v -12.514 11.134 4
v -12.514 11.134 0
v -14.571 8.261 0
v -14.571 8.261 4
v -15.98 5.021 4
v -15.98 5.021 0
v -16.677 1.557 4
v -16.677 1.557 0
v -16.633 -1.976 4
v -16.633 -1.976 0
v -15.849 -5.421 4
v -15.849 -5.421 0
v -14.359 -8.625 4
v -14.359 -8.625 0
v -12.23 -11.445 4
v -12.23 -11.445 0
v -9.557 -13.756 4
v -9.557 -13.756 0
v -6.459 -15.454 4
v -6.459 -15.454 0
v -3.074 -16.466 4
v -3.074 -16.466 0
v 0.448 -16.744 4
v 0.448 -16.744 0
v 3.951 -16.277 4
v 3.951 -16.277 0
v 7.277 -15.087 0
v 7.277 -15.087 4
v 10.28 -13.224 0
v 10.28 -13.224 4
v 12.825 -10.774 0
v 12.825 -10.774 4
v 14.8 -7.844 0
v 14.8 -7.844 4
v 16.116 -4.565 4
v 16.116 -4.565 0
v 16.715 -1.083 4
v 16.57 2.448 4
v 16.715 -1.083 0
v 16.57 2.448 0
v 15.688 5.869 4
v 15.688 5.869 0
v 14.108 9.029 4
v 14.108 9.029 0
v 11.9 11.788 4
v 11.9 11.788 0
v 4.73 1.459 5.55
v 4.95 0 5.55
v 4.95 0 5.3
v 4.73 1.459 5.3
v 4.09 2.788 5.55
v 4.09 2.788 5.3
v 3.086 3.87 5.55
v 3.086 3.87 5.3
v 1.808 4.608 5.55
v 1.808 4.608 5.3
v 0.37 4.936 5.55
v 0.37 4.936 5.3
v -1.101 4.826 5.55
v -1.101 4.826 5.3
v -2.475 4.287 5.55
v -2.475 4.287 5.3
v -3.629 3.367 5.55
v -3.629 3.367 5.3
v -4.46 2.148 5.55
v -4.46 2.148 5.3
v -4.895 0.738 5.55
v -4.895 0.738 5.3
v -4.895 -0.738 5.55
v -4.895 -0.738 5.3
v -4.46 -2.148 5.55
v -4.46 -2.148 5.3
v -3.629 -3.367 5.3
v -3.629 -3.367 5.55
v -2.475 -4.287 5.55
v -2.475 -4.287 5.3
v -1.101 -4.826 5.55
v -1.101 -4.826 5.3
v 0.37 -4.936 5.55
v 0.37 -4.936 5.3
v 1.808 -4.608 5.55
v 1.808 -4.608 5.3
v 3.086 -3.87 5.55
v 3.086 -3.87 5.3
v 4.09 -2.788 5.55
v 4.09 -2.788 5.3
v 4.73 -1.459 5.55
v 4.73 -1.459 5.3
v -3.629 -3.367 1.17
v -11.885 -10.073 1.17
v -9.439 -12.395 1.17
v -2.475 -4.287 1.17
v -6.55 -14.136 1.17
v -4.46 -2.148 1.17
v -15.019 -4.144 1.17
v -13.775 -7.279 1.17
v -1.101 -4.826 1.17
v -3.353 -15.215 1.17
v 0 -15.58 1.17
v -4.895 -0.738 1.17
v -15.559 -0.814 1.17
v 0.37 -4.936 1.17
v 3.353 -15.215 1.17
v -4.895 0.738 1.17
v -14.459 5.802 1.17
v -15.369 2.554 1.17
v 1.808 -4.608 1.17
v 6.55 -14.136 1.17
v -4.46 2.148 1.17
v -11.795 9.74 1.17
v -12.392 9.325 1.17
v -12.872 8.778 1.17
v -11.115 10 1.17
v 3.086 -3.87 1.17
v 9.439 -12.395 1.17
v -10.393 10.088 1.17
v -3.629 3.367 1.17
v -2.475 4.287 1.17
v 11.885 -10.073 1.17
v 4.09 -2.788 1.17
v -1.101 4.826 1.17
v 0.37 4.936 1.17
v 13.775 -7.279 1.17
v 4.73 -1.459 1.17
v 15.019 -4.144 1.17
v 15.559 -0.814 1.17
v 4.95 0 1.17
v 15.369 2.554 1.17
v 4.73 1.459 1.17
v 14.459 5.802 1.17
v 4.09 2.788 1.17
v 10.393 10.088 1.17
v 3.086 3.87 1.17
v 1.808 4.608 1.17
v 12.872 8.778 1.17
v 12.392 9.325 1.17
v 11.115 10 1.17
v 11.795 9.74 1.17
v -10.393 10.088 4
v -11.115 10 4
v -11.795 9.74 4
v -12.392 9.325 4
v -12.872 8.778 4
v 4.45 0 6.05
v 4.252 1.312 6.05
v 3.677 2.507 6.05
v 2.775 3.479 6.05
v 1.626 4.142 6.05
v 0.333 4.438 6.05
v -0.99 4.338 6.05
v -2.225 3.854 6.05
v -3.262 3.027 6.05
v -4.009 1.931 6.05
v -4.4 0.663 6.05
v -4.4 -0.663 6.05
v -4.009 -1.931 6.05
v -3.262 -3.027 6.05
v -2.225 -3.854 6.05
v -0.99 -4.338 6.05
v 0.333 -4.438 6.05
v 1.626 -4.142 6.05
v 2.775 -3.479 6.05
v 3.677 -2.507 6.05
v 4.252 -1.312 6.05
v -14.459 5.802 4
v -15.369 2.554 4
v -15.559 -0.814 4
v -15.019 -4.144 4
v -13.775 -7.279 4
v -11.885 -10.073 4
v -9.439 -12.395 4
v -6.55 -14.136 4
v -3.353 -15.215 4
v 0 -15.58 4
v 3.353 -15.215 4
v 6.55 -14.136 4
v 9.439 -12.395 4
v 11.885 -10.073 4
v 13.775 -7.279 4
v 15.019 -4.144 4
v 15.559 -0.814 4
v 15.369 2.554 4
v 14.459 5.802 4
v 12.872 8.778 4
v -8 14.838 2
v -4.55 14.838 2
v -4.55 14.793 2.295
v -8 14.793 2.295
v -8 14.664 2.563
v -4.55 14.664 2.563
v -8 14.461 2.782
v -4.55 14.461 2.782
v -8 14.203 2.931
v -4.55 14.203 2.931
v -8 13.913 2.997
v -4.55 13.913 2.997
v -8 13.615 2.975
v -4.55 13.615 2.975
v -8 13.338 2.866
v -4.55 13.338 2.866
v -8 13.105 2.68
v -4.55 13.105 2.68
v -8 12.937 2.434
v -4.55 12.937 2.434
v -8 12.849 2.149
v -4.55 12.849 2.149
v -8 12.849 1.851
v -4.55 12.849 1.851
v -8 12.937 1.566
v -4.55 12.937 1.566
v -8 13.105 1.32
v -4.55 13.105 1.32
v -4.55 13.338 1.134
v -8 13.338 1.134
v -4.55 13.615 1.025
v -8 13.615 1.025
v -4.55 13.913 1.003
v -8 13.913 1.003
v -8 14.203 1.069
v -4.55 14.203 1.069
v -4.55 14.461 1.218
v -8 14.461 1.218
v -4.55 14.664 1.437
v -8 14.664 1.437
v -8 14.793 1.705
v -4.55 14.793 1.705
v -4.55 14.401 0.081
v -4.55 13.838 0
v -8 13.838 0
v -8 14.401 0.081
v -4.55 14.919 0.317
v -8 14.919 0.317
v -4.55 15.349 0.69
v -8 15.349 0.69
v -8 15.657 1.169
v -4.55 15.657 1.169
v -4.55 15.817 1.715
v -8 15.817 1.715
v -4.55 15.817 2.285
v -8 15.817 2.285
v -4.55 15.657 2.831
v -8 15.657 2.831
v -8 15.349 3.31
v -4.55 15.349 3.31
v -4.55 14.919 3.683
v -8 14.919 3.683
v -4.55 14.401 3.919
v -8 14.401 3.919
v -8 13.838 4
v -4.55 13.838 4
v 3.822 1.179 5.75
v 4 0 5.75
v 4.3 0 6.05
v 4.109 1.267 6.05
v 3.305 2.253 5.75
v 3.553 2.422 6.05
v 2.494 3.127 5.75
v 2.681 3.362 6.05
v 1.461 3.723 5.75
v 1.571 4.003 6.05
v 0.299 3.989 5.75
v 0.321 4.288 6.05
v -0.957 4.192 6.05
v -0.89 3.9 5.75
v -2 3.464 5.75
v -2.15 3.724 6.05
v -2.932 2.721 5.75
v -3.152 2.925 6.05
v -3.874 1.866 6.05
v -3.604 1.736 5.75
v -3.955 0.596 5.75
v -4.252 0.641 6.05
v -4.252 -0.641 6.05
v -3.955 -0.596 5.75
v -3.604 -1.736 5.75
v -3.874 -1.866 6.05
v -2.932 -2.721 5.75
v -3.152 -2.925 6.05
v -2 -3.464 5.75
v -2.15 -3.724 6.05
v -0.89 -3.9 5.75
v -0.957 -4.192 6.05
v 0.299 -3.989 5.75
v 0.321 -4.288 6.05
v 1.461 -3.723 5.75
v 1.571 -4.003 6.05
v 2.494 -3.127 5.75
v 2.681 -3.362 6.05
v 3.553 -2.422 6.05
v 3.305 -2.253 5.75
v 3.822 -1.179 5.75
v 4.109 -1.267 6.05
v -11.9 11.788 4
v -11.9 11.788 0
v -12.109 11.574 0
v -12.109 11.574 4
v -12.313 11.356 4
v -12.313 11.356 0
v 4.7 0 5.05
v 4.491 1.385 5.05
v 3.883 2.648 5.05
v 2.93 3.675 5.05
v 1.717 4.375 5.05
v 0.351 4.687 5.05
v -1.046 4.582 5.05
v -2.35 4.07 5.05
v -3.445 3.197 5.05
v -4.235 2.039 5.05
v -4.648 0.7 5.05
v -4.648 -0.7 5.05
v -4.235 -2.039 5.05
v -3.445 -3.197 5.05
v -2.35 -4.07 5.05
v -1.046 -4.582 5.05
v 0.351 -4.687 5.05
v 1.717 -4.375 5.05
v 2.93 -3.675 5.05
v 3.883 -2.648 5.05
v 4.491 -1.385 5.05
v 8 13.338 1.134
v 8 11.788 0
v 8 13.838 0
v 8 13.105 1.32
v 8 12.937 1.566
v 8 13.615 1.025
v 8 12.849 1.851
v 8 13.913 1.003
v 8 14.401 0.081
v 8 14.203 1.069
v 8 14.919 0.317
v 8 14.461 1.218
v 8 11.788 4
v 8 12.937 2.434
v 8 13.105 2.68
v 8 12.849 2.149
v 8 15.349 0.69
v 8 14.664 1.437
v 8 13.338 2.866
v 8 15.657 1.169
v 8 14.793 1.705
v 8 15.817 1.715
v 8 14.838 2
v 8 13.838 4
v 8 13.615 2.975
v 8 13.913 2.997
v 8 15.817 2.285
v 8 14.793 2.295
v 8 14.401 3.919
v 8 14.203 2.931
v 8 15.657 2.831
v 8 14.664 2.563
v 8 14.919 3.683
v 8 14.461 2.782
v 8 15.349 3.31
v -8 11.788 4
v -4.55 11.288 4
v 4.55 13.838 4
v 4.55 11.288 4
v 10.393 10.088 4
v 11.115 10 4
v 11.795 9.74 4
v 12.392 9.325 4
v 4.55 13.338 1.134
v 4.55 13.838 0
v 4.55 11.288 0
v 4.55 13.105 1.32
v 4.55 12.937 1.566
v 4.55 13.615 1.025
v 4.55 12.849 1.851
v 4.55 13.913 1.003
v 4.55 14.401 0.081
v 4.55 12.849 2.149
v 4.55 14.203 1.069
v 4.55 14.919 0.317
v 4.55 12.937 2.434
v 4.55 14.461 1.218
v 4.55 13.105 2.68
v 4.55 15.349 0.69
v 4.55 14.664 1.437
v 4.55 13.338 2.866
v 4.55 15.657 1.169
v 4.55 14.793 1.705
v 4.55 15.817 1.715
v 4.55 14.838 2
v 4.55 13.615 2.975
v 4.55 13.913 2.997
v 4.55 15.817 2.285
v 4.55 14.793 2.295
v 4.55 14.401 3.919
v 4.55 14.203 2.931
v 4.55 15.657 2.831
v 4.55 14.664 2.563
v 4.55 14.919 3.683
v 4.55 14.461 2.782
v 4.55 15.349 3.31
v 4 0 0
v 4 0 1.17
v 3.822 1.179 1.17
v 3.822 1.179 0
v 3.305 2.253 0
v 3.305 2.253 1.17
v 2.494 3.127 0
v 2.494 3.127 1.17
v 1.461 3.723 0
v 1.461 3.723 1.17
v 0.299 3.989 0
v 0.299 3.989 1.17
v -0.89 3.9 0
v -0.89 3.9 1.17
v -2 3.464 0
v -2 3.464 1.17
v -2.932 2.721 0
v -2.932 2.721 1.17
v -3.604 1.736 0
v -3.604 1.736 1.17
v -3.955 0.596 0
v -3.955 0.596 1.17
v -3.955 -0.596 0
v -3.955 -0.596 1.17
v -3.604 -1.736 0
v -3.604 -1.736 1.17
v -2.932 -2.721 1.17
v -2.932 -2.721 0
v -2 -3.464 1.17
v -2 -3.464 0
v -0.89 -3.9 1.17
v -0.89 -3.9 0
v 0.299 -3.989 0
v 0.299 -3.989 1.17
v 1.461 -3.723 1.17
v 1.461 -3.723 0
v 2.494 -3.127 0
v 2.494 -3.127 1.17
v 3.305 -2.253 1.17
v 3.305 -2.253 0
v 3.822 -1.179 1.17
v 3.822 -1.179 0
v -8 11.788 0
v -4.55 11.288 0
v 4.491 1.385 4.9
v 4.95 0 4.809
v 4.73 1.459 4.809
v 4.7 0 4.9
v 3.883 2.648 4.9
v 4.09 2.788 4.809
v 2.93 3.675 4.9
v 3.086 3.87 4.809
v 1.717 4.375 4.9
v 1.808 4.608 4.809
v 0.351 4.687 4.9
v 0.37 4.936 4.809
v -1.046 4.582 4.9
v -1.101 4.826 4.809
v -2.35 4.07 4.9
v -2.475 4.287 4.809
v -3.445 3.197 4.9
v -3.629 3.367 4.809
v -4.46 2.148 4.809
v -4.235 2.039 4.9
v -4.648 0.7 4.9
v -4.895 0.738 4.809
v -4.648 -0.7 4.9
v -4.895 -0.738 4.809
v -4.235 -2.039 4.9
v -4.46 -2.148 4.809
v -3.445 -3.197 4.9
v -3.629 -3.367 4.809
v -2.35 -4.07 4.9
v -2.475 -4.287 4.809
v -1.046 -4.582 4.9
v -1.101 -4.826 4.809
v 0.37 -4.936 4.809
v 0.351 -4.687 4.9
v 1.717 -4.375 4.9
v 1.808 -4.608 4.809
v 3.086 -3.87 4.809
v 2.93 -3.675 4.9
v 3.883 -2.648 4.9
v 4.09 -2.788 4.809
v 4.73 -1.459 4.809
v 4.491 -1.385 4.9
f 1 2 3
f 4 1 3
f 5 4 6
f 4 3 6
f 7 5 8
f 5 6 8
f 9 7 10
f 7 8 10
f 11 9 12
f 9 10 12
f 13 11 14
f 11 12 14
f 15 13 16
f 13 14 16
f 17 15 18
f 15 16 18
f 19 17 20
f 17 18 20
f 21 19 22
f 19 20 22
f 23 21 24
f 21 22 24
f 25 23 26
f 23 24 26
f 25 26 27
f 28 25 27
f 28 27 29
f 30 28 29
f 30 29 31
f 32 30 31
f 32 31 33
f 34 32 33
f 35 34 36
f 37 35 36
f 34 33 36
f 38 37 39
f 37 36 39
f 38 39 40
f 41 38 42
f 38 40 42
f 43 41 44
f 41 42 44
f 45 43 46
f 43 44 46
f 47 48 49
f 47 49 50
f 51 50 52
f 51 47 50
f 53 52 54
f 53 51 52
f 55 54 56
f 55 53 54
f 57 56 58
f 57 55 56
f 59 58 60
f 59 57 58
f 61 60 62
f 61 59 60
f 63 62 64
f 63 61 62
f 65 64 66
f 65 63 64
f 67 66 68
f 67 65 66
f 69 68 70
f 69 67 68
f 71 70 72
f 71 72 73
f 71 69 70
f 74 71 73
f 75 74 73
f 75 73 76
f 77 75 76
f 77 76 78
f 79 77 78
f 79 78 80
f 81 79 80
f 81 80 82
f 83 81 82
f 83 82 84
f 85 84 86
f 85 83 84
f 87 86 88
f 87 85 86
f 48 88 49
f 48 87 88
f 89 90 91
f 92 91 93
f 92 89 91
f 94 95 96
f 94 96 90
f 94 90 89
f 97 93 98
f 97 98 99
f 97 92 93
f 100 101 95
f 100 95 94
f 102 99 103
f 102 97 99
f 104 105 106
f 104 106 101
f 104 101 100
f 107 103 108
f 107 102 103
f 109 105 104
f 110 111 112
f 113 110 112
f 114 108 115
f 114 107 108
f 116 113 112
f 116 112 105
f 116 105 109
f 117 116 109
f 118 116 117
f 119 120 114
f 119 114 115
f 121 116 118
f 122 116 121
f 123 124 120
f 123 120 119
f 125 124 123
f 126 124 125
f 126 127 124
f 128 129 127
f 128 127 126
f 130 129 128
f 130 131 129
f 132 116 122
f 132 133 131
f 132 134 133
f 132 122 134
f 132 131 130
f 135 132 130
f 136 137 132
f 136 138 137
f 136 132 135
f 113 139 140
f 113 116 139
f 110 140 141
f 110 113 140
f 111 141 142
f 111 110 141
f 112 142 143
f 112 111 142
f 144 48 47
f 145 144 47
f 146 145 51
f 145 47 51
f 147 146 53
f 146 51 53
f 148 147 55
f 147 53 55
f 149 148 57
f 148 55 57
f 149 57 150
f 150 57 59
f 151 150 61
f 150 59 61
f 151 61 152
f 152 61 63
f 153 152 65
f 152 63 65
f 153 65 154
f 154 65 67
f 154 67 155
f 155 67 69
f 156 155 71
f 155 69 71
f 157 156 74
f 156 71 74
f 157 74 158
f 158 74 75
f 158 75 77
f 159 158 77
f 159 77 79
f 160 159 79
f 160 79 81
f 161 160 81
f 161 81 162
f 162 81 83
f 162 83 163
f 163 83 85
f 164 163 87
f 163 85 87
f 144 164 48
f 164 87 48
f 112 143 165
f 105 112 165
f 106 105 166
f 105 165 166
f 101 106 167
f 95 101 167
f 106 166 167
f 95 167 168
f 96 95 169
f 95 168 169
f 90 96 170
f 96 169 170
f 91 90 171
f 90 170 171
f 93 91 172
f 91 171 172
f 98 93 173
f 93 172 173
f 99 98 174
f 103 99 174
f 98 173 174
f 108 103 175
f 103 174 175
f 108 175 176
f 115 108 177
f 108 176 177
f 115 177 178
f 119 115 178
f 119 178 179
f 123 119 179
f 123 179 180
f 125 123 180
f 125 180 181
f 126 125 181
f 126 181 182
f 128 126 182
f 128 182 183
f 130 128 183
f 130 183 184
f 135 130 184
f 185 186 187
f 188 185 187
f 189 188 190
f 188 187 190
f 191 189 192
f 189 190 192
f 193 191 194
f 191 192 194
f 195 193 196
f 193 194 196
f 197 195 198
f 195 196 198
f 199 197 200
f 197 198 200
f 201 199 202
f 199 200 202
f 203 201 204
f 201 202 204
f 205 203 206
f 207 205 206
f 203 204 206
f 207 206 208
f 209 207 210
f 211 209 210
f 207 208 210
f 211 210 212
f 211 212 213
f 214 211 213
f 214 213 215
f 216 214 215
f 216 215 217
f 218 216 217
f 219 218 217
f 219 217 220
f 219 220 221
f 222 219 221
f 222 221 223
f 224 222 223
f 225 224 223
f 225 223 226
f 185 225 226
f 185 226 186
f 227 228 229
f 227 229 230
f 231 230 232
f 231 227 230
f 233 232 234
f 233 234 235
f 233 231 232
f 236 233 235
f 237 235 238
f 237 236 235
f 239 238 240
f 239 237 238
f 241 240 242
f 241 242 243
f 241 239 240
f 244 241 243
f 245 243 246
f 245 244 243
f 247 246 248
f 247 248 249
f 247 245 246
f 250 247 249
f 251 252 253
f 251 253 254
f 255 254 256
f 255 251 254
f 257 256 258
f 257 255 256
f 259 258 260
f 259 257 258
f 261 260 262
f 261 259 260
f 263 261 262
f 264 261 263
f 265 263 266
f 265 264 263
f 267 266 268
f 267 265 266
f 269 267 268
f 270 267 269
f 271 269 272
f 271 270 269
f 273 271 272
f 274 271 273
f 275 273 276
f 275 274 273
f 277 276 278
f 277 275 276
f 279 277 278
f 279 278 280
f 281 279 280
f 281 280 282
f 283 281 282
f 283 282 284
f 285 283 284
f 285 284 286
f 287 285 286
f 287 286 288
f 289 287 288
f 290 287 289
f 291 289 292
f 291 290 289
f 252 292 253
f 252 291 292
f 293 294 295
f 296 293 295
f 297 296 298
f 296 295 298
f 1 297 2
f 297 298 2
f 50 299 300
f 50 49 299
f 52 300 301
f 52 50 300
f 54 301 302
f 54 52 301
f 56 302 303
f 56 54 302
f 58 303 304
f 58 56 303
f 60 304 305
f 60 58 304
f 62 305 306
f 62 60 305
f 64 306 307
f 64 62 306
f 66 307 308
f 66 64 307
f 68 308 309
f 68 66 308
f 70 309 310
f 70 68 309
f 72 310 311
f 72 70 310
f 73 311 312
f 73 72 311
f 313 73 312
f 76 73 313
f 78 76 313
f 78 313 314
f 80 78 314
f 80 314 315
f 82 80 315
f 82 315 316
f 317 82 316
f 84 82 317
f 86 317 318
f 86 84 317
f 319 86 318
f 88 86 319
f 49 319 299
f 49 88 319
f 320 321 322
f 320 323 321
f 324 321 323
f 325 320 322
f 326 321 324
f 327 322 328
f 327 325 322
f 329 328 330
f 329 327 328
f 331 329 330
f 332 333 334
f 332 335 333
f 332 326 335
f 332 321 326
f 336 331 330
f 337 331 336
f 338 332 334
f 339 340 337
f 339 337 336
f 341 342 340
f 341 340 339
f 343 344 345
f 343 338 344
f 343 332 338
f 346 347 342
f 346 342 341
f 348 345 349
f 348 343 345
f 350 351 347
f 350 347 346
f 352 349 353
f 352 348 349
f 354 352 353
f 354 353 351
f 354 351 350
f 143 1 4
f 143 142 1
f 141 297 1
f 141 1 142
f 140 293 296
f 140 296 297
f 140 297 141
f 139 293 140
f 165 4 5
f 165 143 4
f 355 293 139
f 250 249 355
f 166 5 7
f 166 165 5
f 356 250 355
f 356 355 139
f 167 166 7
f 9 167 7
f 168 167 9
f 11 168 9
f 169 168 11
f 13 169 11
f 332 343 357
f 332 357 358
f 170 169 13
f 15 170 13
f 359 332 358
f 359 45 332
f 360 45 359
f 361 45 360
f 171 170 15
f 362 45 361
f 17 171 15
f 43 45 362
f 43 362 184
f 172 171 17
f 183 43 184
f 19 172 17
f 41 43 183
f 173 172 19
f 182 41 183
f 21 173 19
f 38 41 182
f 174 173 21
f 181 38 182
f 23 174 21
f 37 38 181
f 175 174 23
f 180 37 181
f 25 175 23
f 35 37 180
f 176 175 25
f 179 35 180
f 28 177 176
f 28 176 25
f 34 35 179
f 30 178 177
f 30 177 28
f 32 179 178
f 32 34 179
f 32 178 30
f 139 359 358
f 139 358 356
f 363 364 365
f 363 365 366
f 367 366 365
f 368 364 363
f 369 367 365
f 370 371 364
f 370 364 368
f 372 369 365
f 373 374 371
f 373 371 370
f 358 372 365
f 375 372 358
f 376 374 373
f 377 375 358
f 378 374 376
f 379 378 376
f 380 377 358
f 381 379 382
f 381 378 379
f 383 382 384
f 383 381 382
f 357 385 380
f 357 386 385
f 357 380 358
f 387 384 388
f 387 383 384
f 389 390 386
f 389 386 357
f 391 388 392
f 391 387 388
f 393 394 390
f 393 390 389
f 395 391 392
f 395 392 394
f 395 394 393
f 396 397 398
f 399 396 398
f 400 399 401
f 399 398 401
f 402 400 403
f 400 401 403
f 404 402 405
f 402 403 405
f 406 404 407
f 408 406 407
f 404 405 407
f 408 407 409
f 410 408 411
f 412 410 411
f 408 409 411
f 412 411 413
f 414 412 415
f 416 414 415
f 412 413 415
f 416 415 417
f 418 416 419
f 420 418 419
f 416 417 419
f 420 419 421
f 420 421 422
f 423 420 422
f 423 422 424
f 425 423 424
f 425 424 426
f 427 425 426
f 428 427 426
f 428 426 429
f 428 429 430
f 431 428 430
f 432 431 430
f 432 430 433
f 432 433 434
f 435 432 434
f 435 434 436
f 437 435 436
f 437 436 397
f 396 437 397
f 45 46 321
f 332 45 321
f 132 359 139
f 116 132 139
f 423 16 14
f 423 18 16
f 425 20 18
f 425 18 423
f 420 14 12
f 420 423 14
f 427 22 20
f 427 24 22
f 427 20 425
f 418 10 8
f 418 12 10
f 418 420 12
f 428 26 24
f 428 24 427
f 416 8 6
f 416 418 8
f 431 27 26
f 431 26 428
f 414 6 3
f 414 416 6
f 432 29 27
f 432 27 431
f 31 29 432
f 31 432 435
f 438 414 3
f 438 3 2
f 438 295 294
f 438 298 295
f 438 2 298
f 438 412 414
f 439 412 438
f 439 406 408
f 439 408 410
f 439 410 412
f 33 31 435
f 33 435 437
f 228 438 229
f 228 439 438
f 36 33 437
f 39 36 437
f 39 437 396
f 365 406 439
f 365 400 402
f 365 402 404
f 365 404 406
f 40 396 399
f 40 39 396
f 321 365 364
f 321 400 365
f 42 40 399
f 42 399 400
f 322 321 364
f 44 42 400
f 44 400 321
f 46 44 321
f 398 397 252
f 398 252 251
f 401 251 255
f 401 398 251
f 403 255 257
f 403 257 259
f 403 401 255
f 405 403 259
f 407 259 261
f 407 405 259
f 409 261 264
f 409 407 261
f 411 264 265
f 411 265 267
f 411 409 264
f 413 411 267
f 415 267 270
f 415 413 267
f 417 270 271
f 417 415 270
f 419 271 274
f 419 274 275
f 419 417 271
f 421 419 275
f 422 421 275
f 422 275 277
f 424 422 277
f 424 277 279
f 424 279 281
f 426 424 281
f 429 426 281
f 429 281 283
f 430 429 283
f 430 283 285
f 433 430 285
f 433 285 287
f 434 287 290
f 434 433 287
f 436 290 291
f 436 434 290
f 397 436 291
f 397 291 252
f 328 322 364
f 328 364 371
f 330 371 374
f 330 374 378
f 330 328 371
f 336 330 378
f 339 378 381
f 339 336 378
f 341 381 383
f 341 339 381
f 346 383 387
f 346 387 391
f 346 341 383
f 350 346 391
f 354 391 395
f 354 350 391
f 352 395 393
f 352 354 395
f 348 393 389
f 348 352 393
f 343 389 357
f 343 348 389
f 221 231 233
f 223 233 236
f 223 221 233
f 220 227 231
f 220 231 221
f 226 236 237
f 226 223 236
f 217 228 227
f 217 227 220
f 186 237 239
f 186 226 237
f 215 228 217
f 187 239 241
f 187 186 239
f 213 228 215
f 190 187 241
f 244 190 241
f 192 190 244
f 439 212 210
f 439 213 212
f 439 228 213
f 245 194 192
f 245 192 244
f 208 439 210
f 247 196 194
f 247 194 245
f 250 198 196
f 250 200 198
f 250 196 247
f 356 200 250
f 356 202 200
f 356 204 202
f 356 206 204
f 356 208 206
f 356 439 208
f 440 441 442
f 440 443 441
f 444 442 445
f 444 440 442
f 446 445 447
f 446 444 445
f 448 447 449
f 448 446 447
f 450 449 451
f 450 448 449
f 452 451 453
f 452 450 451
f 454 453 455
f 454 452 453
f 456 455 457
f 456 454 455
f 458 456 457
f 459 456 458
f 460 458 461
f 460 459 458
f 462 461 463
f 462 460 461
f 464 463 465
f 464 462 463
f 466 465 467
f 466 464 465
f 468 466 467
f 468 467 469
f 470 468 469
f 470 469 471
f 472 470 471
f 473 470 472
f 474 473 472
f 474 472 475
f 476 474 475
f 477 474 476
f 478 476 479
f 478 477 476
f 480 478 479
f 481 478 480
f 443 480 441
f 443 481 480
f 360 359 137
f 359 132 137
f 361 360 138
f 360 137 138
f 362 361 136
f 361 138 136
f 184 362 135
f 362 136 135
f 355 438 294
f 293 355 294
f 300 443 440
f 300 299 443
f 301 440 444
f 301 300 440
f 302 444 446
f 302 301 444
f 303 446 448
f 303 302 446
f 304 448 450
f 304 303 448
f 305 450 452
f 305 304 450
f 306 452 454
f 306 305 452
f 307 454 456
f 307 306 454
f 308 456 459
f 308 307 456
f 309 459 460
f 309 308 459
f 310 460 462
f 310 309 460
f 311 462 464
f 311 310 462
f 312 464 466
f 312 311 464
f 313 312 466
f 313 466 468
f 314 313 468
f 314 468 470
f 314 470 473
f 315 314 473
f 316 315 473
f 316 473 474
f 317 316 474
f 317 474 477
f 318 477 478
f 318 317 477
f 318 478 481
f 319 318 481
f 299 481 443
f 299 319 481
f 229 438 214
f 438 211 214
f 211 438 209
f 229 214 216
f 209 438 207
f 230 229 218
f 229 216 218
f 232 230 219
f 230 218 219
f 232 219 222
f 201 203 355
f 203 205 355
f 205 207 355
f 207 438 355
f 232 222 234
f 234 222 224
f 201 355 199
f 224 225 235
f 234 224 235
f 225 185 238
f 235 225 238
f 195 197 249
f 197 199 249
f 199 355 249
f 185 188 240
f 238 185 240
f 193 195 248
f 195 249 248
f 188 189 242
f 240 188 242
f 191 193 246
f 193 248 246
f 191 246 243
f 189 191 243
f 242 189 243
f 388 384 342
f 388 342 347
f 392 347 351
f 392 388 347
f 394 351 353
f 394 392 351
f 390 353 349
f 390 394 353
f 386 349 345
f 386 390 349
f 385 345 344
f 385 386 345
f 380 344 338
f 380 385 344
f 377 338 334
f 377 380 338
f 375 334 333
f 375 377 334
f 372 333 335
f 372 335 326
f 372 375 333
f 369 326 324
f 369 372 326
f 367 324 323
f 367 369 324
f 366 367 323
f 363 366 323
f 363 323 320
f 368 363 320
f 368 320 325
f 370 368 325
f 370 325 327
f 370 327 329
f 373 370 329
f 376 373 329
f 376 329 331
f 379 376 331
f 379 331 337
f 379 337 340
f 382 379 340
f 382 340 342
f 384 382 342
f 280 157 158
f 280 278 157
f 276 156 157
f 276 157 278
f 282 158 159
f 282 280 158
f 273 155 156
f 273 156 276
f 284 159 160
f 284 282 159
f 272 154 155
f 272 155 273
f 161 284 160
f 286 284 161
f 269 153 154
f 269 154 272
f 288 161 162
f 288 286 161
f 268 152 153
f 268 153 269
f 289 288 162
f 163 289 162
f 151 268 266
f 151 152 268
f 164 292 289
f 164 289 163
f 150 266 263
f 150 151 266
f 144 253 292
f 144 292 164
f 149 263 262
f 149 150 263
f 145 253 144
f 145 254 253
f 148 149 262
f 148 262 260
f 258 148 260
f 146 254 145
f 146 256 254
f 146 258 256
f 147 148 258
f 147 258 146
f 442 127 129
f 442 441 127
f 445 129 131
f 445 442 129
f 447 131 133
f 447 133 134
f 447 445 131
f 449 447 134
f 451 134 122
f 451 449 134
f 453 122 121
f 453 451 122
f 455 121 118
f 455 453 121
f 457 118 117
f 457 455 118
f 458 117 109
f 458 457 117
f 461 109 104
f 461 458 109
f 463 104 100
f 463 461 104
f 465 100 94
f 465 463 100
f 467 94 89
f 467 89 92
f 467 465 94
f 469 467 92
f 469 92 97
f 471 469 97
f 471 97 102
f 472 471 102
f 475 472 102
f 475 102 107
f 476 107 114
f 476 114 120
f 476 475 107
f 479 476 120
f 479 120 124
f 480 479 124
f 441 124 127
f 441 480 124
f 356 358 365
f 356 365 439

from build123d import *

# Parameters (mm, degrees)
F1_DEPTH       = 4
F3_DEPTH       = 2.83
F6_DEPTH       = 1.171
F7_SIZE        = 0.5
F8_SIZE        = 0.3
F9_R           = 1
F10_DEPTH      = 8
F10_DEPTH_BACK = 8
F11_W          = 9.1
F11_H          = 5.6
F12_DEPTH      = 0.5
F12_DEPTH_BACK = 4.051
F13_R          = 3


with BuildPart() as f1:
    # F0 (on Top) → F1 (new body)
    with BuildSketch(Plane.XY):
        with BuildLine():
            Line((11.9, 11.7878115017), (-11.9, 11.7878115017))
            ThreePointArc((-11.9, 11.7878115017), (-12.2113231748, 11.464993952), (-12.5138921377, 11.1339572285))
            ThreePointArc((-12.5138921377, 11.1339572285), (0.4484386712, -16.7439960212), (11.9, 11.7878115017))
        make_face()
    extrude(amount=F1_DEPTH)

    # F2 (on face) → F3 (cut)
    with BuildSketch(Plane.XY.offset(4)):
        with BuildLine():
            Line((11.8731823496, 10.0878115017), (-11.8731823496, 10.0878115017))
            ThreePointArc((-11.8731823496, 10.0878115017), (0, -15.58), (11.8731823496, 10.0878115017))
        make_face()
    extrude(amount=-F3_DEPTH, mode=Mode.SUBTRACT)

    # F4 (on Front) → F5 (revolve)
    with BuildSketch(Plane.XZ):
        Polygon((4, 1.17), (4.95, 1.17), (4.95, 4.8090074414), (4.7, 4.9), (4.7, 5.05), (4.95, 5.3), (4.95, 6.05), (4, 6.05), align=None)
    revolve(axis=Axis((0, 0, 5.7729503606), (0, 0, 1)))

    # F6 (cut, through all): a face of the model
    f6_faces = [f1.faces().sort_by_distance(p)[0] for p in [
        (0, 0, 1.17),
    ]]
    extrude(f6_faces, amount=-F6_DEPTH, mode=Mode.SUBTRACT)

    # F7
    f7_edges = [f1.edges().sort_by_distance(p)[0] for p in [
        (-4.95, 0, 6.05),
    ]]
    chamfer(f7_edges, length=F7_SIZE)

    # F8
    f8_edges = [f1.edges().sort_by_distance(p)[0] for p in [
        (-4, 0, 6.05),
    ]]
    chamfer(f8_edges, length=F8_SIZE)

    # F9 (on Right) → F10 (join, two sides)
    with BuildSketch(Plane.YZ) as f10_sk:
        with BuildLine():
            Line((13.8378115017, 4), (11.7878115017, 4))
            Line((11.7878115017, 4), (11.7878115017, 0))
            Line((11.7878115017, 0), (13.8378115017, 0))
            ThreePointArc((13.8378115017, 0), (15.8378115017, 2), (13.8378115017, 4))
        make_face()
        with Locations((13.8378115017, 2)):
            Circle(F9_R, mode=Mode.SUBTRACT)
    extrude(amount=F10_DEPTH)
    extrude(f10_sk.sketch, amount=-F10_DEPTH_BACK)

    # F11 (on face) → F12 (cut, two sides)
    with BuildSketch(Plane(origin=(0, 11.7878115017, 0), x_dir=(-1, 0, 0), z_dir=(0, 1, 0))) as f12_sk:
        with Locations((0, 2)):
            Rectangle(F11_W, F11_H)
    extrude(amount=-F12_DEPTH, mode=Mode.SUBTRACT)
    extrude(f12_sk.sketch, amount=F12_DEPTH_BACK, mode=Mode.SUBTRACT)

    # F13
    f13_edges = [f1.edges().sort_by_distance(p)[0] for p in [
        (-11.873182, 10.087812, 2.585),
        (11.873182, 10.087812, 2.585),
    ]]
    fillet(f13_edges, radius=F13_R)


solid = f1.part
